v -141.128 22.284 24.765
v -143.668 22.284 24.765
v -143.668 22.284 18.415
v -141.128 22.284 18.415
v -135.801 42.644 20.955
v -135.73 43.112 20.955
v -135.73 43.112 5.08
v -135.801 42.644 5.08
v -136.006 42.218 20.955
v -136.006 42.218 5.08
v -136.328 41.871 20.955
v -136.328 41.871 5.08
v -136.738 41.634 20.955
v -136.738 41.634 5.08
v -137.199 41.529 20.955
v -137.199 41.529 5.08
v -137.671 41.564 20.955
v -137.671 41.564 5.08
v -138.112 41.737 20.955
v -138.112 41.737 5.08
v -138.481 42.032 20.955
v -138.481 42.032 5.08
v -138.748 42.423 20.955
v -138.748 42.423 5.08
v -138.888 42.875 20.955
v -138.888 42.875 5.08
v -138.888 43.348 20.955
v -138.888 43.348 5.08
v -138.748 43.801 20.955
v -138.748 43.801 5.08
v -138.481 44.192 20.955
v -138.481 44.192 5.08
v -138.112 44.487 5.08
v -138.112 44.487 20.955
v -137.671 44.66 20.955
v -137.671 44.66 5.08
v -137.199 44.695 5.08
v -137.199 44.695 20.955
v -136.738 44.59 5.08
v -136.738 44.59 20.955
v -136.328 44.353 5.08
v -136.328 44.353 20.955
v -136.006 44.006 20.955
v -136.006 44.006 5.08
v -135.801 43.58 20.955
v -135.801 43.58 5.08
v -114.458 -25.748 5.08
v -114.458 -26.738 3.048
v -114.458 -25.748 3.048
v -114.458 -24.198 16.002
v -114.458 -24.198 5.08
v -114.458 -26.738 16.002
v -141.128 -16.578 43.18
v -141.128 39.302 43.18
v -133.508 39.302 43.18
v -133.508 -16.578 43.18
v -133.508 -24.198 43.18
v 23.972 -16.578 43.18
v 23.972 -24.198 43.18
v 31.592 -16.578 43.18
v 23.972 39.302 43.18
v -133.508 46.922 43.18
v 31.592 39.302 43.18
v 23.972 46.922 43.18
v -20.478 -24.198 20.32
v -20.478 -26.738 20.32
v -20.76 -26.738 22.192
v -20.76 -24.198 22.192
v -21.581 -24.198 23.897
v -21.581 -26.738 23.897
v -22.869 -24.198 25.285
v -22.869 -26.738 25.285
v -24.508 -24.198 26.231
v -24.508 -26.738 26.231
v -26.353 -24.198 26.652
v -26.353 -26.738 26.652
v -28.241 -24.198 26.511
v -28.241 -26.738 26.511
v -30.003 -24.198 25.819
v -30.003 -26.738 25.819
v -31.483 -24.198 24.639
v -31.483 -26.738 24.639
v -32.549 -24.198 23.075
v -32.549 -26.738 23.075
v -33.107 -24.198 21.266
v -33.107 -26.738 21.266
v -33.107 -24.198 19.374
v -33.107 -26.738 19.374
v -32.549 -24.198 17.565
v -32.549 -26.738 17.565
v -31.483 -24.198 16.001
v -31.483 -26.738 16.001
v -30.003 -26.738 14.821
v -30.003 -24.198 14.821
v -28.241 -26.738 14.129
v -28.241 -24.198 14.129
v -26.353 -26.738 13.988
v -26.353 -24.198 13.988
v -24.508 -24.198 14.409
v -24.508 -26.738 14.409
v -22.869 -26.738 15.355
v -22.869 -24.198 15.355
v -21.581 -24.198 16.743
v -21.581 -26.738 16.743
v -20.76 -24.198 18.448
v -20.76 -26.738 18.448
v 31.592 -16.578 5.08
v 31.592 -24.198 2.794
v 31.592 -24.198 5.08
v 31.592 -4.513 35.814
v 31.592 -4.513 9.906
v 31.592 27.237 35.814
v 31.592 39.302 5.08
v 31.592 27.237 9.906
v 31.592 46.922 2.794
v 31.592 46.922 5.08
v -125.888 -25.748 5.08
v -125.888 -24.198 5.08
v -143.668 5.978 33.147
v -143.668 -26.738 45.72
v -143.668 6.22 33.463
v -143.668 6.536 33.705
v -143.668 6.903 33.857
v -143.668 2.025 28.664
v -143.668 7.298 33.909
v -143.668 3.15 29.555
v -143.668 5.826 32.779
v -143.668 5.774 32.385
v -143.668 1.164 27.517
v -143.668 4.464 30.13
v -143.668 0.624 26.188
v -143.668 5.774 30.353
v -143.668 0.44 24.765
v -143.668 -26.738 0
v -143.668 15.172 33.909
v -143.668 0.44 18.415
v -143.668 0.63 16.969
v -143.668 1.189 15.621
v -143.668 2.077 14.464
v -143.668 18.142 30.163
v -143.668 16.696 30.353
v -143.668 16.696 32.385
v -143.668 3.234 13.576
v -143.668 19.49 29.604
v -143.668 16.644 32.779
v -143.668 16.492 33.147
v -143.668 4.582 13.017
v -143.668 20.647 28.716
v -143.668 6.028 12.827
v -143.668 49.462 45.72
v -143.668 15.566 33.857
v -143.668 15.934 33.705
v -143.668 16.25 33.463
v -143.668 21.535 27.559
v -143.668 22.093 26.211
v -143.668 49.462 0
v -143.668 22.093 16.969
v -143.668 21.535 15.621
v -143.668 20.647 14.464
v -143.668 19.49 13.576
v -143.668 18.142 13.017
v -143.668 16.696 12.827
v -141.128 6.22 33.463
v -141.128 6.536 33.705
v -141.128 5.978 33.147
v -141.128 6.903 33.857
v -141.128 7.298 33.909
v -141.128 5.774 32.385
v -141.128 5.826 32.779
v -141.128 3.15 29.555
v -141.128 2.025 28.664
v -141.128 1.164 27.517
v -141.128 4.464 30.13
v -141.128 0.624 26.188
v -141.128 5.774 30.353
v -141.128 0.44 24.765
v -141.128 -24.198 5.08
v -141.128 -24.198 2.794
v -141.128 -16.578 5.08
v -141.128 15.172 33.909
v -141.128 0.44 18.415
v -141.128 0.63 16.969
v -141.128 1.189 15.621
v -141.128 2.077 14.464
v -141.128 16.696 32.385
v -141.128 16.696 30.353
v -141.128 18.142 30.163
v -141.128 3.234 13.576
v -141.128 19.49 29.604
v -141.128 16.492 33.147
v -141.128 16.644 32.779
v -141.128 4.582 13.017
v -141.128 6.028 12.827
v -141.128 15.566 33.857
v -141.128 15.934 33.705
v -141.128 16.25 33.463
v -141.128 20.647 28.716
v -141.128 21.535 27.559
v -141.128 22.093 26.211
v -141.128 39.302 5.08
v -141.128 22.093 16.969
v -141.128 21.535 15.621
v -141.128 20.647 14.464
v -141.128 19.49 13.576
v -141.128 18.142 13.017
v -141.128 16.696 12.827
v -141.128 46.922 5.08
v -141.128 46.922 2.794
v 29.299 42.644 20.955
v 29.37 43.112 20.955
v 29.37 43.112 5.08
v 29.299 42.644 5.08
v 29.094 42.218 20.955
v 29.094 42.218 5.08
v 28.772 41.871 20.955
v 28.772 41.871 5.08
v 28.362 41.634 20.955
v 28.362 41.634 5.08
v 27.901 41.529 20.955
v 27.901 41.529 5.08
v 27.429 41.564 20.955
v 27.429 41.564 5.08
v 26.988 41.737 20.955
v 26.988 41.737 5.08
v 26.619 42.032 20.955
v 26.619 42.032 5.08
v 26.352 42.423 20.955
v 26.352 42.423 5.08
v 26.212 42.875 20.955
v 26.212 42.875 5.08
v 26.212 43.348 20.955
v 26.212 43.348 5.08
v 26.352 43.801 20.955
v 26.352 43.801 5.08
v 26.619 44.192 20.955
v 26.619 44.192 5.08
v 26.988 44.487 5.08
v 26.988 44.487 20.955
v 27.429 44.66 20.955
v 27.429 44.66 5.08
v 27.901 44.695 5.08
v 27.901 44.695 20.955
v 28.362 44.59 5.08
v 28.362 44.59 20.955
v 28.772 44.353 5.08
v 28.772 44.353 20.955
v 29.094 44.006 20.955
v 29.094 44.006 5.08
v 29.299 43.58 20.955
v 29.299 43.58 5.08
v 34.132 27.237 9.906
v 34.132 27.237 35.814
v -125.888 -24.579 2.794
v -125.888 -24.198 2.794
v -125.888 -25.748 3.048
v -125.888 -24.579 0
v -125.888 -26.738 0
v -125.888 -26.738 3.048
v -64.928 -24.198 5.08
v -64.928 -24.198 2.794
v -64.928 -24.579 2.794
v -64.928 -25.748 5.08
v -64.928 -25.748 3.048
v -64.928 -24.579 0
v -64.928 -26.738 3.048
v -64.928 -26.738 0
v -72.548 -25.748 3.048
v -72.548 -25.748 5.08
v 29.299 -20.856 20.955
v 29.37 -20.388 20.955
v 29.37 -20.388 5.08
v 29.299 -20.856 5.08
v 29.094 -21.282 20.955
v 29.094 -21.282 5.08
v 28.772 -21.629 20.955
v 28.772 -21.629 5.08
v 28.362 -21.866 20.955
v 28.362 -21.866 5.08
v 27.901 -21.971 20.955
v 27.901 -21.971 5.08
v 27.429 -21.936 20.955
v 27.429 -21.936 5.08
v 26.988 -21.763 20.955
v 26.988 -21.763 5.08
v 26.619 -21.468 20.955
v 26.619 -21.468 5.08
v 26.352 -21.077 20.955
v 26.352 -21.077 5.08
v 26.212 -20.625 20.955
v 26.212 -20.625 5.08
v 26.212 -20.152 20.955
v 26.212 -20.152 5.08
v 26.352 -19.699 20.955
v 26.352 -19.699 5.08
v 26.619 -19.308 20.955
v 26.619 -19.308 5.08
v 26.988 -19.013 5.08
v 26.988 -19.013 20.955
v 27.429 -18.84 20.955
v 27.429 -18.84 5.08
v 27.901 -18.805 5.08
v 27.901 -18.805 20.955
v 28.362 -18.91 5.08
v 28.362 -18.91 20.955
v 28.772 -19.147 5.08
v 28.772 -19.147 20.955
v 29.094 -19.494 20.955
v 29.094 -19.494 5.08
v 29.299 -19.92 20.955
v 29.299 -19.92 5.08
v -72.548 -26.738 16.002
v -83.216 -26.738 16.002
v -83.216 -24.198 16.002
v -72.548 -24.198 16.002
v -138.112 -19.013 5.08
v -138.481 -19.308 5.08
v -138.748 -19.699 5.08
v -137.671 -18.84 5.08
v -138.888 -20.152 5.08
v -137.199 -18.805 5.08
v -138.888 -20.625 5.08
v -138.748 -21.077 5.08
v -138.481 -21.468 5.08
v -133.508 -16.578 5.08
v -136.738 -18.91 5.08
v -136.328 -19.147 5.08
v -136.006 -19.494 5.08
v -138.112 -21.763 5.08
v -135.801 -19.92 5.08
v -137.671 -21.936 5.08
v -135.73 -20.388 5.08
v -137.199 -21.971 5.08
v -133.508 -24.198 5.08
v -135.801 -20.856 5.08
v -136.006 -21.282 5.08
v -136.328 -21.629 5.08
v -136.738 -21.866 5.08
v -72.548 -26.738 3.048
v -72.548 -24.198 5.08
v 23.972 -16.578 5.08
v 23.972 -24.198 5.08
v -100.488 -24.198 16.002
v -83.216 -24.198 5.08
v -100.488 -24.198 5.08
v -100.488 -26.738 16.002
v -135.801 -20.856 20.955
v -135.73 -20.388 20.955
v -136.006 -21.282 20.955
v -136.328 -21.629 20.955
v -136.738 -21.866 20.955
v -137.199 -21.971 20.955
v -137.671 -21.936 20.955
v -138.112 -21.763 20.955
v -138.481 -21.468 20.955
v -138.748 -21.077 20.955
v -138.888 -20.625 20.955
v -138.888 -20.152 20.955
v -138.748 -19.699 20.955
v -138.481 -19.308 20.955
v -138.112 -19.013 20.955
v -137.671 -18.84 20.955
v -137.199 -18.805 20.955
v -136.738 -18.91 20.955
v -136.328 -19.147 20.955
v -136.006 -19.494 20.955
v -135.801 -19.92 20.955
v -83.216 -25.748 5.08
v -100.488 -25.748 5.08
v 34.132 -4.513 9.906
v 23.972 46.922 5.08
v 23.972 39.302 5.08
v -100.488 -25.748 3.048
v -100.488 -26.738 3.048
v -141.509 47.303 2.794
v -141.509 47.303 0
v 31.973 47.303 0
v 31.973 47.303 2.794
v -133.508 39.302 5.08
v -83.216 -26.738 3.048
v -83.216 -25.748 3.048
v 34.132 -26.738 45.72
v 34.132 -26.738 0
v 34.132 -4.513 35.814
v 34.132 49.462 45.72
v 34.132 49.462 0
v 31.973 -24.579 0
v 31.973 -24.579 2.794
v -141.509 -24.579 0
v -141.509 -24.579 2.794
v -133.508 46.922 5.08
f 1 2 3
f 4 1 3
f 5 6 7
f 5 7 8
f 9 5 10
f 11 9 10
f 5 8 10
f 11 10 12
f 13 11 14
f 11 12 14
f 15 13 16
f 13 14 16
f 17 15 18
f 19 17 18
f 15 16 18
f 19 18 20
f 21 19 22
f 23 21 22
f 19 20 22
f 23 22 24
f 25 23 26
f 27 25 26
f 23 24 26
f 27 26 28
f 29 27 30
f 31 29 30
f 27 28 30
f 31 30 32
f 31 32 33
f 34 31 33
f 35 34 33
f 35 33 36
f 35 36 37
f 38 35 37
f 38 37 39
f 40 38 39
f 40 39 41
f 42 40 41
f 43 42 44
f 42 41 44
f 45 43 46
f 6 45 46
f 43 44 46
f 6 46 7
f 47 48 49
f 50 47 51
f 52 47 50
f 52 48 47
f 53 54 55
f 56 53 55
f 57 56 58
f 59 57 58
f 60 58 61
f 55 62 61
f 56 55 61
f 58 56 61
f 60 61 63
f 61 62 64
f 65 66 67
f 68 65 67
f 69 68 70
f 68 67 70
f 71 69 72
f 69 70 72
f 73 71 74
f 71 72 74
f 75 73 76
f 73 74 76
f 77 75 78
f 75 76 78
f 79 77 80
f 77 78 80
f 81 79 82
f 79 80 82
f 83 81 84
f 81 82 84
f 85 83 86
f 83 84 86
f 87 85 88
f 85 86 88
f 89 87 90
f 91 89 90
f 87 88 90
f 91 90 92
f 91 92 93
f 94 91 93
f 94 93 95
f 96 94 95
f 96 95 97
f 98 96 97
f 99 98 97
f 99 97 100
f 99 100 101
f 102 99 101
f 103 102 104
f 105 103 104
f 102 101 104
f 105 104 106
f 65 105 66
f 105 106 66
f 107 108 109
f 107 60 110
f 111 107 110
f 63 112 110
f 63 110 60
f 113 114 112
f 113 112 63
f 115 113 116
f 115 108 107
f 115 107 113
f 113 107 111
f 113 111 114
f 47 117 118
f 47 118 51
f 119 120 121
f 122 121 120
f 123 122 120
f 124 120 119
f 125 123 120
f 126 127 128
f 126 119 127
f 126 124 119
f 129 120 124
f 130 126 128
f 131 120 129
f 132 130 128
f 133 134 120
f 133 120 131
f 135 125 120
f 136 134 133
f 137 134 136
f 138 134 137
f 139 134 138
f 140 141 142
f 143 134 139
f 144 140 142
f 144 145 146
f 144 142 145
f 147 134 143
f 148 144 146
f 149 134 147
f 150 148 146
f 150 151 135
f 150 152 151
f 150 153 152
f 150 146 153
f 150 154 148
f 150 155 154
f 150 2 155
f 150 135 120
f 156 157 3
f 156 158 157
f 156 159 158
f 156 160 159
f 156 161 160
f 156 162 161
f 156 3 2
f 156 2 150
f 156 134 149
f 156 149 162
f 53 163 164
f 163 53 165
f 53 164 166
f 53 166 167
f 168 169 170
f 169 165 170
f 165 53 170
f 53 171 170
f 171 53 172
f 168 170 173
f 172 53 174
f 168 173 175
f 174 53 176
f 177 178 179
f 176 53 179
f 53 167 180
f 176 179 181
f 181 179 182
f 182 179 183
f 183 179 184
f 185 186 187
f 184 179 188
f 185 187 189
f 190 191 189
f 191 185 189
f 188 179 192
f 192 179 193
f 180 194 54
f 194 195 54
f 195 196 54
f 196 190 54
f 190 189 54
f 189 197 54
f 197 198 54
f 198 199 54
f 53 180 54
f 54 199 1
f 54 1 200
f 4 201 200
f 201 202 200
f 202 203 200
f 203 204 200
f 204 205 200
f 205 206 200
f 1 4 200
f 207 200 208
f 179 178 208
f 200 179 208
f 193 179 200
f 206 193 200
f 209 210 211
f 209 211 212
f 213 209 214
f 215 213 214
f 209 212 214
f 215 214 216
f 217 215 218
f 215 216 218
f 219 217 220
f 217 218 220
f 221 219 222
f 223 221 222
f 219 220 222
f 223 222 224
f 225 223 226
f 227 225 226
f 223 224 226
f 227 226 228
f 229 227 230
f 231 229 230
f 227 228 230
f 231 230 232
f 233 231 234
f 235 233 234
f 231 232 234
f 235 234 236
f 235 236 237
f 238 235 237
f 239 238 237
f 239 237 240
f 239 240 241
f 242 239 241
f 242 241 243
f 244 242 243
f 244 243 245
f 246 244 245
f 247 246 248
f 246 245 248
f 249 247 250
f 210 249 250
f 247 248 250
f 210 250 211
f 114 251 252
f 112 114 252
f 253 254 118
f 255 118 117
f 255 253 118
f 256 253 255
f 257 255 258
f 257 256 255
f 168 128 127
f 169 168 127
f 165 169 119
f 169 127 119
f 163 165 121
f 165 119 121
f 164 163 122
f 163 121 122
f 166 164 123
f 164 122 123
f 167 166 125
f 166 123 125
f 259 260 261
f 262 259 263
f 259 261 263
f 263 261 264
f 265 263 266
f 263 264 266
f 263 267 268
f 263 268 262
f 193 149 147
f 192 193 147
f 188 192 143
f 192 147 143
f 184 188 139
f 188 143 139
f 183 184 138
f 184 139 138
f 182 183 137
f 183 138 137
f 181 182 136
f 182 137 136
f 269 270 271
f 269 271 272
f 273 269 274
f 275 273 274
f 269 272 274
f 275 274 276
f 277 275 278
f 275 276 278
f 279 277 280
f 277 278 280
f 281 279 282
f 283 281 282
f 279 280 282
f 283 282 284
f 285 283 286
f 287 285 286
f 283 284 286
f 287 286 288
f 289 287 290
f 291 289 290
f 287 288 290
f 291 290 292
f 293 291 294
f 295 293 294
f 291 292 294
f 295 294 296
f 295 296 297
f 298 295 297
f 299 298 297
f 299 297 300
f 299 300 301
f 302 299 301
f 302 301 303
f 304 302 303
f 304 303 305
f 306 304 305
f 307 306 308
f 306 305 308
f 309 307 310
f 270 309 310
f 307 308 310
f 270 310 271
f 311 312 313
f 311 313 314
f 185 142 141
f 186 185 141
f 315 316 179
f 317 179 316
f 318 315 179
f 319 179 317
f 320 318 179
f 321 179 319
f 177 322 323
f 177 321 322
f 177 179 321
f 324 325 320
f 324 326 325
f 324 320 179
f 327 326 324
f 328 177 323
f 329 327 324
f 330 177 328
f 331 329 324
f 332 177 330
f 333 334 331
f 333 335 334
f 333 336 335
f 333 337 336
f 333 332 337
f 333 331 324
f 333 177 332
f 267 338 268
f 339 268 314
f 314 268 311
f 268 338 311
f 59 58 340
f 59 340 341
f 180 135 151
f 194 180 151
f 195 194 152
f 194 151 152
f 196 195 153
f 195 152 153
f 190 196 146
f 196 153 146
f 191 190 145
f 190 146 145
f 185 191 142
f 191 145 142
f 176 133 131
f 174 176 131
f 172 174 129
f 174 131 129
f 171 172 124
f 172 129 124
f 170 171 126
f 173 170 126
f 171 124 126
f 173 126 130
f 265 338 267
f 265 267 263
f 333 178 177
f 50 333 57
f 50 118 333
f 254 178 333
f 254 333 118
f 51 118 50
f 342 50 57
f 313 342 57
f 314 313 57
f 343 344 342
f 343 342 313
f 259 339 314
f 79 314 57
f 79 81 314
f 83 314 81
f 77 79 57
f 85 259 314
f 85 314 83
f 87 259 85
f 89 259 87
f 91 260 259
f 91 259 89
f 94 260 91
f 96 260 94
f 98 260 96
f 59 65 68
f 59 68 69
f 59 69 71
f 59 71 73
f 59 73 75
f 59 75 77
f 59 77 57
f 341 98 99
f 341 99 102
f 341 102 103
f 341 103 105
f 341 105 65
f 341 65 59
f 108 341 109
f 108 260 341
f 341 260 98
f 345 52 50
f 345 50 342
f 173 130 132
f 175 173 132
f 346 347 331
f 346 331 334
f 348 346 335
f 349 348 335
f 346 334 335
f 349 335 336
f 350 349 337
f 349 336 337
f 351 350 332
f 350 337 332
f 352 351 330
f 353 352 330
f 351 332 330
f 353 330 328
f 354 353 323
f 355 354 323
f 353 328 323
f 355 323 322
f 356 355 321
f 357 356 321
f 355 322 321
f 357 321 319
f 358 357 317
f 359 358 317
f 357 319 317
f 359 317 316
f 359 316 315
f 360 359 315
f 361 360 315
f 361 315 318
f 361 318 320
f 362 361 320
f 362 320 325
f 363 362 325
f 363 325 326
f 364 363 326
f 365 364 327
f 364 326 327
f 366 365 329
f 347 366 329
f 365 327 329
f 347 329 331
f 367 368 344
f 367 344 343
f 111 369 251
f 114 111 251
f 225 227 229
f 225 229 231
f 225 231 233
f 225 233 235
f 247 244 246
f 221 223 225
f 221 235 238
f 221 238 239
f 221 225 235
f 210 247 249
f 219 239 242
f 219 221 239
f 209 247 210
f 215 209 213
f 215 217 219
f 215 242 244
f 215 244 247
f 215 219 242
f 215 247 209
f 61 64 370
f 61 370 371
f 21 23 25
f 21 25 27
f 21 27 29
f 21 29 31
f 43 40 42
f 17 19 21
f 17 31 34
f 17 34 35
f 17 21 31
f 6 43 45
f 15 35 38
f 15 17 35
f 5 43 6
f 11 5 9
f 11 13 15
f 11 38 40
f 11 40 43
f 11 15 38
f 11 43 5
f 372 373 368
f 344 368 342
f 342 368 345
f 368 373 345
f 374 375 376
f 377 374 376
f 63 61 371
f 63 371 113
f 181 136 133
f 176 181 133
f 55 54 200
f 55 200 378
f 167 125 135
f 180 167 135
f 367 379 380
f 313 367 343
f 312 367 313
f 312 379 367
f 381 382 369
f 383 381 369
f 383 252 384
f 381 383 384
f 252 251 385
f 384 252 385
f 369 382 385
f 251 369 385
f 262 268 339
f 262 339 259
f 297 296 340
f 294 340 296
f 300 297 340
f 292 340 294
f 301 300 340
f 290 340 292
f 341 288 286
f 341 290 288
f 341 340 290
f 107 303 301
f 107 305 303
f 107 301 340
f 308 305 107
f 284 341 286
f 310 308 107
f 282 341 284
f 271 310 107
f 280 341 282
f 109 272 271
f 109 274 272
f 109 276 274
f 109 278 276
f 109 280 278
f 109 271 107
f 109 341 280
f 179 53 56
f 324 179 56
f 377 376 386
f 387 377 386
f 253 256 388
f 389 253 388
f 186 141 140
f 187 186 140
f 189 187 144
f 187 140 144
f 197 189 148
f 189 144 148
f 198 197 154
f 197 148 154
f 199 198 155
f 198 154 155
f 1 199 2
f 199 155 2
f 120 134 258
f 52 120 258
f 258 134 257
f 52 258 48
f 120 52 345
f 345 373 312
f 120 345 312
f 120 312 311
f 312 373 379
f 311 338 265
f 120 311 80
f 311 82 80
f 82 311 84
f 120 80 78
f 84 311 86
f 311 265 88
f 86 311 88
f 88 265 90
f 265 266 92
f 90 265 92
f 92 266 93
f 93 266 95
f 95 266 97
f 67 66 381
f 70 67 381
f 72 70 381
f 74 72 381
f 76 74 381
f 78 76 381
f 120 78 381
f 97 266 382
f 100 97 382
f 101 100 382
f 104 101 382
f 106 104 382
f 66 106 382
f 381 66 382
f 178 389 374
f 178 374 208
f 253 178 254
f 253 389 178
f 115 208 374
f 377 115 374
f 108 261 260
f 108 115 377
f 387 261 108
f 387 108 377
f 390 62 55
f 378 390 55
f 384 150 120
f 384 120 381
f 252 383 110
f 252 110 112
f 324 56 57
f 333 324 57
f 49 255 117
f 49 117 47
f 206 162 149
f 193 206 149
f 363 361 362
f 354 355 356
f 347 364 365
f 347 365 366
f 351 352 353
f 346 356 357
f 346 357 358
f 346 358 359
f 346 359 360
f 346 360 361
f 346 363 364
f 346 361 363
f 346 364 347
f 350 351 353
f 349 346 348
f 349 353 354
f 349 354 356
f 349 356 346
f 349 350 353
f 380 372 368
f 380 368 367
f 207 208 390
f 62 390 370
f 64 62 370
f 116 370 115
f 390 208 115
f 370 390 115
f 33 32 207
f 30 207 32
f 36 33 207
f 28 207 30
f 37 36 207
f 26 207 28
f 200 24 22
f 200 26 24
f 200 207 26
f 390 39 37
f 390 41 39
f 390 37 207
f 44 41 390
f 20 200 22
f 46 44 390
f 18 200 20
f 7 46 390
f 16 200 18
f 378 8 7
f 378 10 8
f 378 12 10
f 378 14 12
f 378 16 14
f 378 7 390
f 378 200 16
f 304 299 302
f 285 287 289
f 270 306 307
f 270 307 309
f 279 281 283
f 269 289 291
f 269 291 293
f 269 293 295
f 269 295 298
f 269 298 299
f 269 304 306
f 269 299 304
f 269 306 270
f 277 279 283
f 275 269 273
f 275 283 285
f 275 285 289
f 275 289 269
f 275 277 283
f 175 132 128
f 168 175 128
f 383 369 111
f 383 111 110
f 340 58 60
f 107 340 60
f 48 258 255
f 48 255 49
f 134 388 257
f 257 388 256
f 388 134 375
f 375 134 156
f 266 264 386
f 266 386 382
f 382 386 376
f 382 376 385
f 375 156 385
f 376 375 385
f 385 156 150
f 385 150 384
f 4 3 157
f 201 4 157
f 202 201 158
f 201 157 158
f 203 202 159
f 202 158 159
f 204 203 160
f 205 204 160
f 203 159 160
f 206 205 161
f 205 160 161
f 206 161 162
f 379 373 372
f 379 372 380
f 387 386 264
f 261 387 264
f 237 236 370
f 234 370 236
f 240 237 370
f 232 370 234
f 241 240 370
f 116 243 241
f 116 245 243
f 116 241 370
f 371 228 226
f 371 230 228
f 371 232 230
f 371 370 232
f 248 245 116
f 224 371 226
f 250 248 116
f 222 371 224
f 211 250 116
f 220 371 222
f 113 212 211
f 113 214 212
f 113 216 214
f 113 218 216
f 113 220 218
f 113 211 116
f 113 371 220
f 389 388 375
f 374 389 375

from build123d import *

# Parameters (mm, degrees)
F0_W      = 177.8
F0_H      = 76.2
F1_DEPTH  = 45.72
F2_T      = -2.54
F3_W      = 13.97
F3_H      = 16.002
F3_W_2    = 10.668
F4_DEPTH  = 2.54
F5_W      = 11.43
F5_H      = 2.54
F5_W_2    = 41.91
F5_W_3    = 7.62
F6_DEPTH  = 3.048
F8_DEPTH  = 2.54
F9_W      = 31.75
F9_H      = 25.908
F10_DEPTH = 2.54
F11_W     = 60.96
F11_H     = 1.5494
F12_DEPTH = 5.08
F13_W     = 7.62
F13_H     = 7.62
F14_DEPTH = 38.1
F15_R     = 1.5875
F16_DEPTH = 15.875
F17_R     = 6.35
F18_DEPTH = 2.54
F20_DEPTH = 2.794


with BuildPart() as f1:
    # F0 (on Top) → F1 (new body)
    with BuildSketch(Plane.XY):
        with Locations((-54.7677724445, 11.3618699834)):
            Rectangle(F0_W, F0_H)
    extrude(amount=F1_DEPTH)

    # F2
    f2_openings = [f1.faces().sort_by_distance(p)[0] for p in [
        (-54.767772, 11.36187, 0),
    ]]
    offset(amount=F2_T, openings=f2_openings)

    # F3 (on face) → F4 (cut)
    with BuildSketch(Plane.XZ.offset(26.7381300166)):
        with Locations((-107.4727724445, 8.001)):
            Rectangle(F3_W, F3_H)
        with Locations((-77.8817724445, 8.001)):
            Rectangle(F3_W_2, F3_H)
    extrude(amount=-F4_DEPTH, mode=Mode.SUBTRACT)

    # F5 (on face) → F6 (cut)
    with BuildSketch(Plane(origin=(0, 0, 0), x_dir=(1, 0, 0), z_dir=(0, 0, -1))):
        with Locations((-120.1727724445, 25.4681300166)):
            Rectangle(F5_W, F5_H)
        with Locations((-93.5027724445, 25.4681300166)):
            Rectangle(F5_W_2, F5_H)
        with Locations((-68.7377724445, 25.4681300166)):
            Rectangle(F5_W_3, F5_H)
    extrude(amount=-F6_DEPTH, mode=Mode.SUBTRACT)

    # F7 (on face) → F8 (cut)
    with BuildSketch(Plane(origin=(-143.6677724445, 0, 0), x_dir=(0, -1, 0), z_dir=(-1, 0, 0))):
        with BuildLine():
            Line((-16.6958699834, 32.385), (-16.6958699834, 30.353))
            Line((-16.6958699834, 30.353), (-6.0378982208, 30.353))
            Line((-6.0378982208, 30.353), (-5.7738699834, 30.353))
            Line((-5.7738699834, 30.353), (-5.7738699834, 32.385))
            ThreePointArc((-5.7738699834, 32.385), (-6.2202392488, 33.4626307345), (-7.2978699834, 33.909))
            Line((-7.2978699834, 33.909), (-15.1718699834, 33.909))
            ThreePointArc((-15.1718699834, 33.909), (-16.2495007179, 33.4626307345), (-16.6958699834, 32.385))
        make_face()
        with BuildLine():
            Line((-6.0378982208, 30.353), (-16.6958699834, 30.353))
            ThreePointArc((-16.6958699834, 30.353), (-20.6471826766, 28.7163126933), (-22.2838699834, 24.765))
            Line((-22.2838699834, 24.765), (-22.2838699834, 18.415))
            ThreePointArc((-22.2838699834, 18.415), (-20.6471826766, 14.4636873067), (-16.6958699834, 12.827))
            Line((-16.6958699834, 12.827), (-6.0278699834, 12.827))
            ThreePointArc((-6.0278699834, 12.827), (-2.0765572901, 14.4636873067), (-0.4398699834, 18.415))
            Line((-0.4398699834, 18.415), (-0.4398699834, 24.765))
            ThreePointArc((-0.4398699834, 24.765), (-1.5576455077, 28.1180340196), (-4.4637916501, 30.1296437876))
            Line((-4.4637916501, 30.1296437876), (-5.7738699834, 30.353))
            Line((-5.7738699834, 30.353), (-6.0378982208, 30.353))
        make_face()
    extrude(amount=-F8_DEPTH, mode=Mode.SUBTRACT)

    # F9 (on face) → F10 (cut)
    with BuildSketch(Plane.YZ.offset(34.1322275555)):
        with Locations((11.3618699834, 22.86)):
            Rectangle(F9_W, F9_H)
    extrude(amount=-F10_DEPTH, mode=Mode.SUBTRACT)

    # F11 (on face) → F12 (cut)
    with BuildSketch(Plane(origin=(0, 0, 0), x_dir=(1, 0, 0), z_dir=(0, 0, -1))):
        with Locations((-95.4077724445, 24.9728300166)):
            Rectangle(F11_W, F11_H)
    extrude(amount=-F12_DEPTH, mode=Mode.SUBTRACT)

    # F13 (on face) → F14 (join)
    with BuildSketch(Plane(origin=(0, 0, 43.18), x_dir=(1, 0, 0), z_dir=(0, 0, -1))):
        with Locations((27.7822275555, 20.3881300166)):
            Rectangle(F13_W, F13_H)
        with Locations((27.7822275555, -43.1118699834)):
            Rectangle(F13_W, F13_H)
        with Locations((-137.3177724445, 20.3881300166)):
            Rectangle(F13_W, F13_H)
        with Locations((-137.3177724445, -43.1118699834)):
            Rectangle(F13_W, F13_H)
    extrude(amount=F14_DEPTH)

    # F15 (on face) → F16 (cut)
    with BuildSketch(Plane(origin=(0, 0, 5.08), x_dir=(1, 0, 0), z_dir=(0, 0, -1))):
        with Locations((-137.3177724445, 20.3881300166)):
            Circle(F15_R)
        with Locations((-137.3177724445, -43.1118699834)):
            Circle(F15_R)
        with Locations((27.7822275555, 20.3881300166)):
            Circle(F15_R)
        with Locations((27.7822275555, -43.1118699834)):
            Circle(F15_R)
    extrude(amount=-F16_DEPTH, mode=Mode.SUBTRACT)

    # F17 (on face) → F18 (cut)
    with BuildSketch(Plane.XZ.offset(26.7381300166)):
        with Locations((-26.8277724445, 20.32)):
            Circle(F17_R)
    extrude(amount=-F18_DEPTH, mode=Mode.SUBTRACT)

    # F19 (on face) → F20 (cut)
    with BuildSketch(Plane(origin=(0, 0, 0), x_dir=(1, 0, 0), z_dir=(0, 0, -1))):
        Polygon((-125.8877724445, 24.5791300166), (-141.5087724445, 24.5791300166), (-141.5087724445, -47.3028699834), (31.9732275555, -47.3028699834), (31.9732275555, 24.5791300166), (-64.9277724445, 24.5791300166), (-64.9277724445, 24.1981300166), (31.5922275555, 24.1981300166), (31.5922275555, -46.9218699834), (-141.1277724445, -46.9218699834), (-141.1277724445, 24.1981300166), (-125.8877724445, 24.1981300166), align=None)
    extrude(amount=-F20_DEPTH, mode=Mode.SUBTRACT)


solid = f1.part
